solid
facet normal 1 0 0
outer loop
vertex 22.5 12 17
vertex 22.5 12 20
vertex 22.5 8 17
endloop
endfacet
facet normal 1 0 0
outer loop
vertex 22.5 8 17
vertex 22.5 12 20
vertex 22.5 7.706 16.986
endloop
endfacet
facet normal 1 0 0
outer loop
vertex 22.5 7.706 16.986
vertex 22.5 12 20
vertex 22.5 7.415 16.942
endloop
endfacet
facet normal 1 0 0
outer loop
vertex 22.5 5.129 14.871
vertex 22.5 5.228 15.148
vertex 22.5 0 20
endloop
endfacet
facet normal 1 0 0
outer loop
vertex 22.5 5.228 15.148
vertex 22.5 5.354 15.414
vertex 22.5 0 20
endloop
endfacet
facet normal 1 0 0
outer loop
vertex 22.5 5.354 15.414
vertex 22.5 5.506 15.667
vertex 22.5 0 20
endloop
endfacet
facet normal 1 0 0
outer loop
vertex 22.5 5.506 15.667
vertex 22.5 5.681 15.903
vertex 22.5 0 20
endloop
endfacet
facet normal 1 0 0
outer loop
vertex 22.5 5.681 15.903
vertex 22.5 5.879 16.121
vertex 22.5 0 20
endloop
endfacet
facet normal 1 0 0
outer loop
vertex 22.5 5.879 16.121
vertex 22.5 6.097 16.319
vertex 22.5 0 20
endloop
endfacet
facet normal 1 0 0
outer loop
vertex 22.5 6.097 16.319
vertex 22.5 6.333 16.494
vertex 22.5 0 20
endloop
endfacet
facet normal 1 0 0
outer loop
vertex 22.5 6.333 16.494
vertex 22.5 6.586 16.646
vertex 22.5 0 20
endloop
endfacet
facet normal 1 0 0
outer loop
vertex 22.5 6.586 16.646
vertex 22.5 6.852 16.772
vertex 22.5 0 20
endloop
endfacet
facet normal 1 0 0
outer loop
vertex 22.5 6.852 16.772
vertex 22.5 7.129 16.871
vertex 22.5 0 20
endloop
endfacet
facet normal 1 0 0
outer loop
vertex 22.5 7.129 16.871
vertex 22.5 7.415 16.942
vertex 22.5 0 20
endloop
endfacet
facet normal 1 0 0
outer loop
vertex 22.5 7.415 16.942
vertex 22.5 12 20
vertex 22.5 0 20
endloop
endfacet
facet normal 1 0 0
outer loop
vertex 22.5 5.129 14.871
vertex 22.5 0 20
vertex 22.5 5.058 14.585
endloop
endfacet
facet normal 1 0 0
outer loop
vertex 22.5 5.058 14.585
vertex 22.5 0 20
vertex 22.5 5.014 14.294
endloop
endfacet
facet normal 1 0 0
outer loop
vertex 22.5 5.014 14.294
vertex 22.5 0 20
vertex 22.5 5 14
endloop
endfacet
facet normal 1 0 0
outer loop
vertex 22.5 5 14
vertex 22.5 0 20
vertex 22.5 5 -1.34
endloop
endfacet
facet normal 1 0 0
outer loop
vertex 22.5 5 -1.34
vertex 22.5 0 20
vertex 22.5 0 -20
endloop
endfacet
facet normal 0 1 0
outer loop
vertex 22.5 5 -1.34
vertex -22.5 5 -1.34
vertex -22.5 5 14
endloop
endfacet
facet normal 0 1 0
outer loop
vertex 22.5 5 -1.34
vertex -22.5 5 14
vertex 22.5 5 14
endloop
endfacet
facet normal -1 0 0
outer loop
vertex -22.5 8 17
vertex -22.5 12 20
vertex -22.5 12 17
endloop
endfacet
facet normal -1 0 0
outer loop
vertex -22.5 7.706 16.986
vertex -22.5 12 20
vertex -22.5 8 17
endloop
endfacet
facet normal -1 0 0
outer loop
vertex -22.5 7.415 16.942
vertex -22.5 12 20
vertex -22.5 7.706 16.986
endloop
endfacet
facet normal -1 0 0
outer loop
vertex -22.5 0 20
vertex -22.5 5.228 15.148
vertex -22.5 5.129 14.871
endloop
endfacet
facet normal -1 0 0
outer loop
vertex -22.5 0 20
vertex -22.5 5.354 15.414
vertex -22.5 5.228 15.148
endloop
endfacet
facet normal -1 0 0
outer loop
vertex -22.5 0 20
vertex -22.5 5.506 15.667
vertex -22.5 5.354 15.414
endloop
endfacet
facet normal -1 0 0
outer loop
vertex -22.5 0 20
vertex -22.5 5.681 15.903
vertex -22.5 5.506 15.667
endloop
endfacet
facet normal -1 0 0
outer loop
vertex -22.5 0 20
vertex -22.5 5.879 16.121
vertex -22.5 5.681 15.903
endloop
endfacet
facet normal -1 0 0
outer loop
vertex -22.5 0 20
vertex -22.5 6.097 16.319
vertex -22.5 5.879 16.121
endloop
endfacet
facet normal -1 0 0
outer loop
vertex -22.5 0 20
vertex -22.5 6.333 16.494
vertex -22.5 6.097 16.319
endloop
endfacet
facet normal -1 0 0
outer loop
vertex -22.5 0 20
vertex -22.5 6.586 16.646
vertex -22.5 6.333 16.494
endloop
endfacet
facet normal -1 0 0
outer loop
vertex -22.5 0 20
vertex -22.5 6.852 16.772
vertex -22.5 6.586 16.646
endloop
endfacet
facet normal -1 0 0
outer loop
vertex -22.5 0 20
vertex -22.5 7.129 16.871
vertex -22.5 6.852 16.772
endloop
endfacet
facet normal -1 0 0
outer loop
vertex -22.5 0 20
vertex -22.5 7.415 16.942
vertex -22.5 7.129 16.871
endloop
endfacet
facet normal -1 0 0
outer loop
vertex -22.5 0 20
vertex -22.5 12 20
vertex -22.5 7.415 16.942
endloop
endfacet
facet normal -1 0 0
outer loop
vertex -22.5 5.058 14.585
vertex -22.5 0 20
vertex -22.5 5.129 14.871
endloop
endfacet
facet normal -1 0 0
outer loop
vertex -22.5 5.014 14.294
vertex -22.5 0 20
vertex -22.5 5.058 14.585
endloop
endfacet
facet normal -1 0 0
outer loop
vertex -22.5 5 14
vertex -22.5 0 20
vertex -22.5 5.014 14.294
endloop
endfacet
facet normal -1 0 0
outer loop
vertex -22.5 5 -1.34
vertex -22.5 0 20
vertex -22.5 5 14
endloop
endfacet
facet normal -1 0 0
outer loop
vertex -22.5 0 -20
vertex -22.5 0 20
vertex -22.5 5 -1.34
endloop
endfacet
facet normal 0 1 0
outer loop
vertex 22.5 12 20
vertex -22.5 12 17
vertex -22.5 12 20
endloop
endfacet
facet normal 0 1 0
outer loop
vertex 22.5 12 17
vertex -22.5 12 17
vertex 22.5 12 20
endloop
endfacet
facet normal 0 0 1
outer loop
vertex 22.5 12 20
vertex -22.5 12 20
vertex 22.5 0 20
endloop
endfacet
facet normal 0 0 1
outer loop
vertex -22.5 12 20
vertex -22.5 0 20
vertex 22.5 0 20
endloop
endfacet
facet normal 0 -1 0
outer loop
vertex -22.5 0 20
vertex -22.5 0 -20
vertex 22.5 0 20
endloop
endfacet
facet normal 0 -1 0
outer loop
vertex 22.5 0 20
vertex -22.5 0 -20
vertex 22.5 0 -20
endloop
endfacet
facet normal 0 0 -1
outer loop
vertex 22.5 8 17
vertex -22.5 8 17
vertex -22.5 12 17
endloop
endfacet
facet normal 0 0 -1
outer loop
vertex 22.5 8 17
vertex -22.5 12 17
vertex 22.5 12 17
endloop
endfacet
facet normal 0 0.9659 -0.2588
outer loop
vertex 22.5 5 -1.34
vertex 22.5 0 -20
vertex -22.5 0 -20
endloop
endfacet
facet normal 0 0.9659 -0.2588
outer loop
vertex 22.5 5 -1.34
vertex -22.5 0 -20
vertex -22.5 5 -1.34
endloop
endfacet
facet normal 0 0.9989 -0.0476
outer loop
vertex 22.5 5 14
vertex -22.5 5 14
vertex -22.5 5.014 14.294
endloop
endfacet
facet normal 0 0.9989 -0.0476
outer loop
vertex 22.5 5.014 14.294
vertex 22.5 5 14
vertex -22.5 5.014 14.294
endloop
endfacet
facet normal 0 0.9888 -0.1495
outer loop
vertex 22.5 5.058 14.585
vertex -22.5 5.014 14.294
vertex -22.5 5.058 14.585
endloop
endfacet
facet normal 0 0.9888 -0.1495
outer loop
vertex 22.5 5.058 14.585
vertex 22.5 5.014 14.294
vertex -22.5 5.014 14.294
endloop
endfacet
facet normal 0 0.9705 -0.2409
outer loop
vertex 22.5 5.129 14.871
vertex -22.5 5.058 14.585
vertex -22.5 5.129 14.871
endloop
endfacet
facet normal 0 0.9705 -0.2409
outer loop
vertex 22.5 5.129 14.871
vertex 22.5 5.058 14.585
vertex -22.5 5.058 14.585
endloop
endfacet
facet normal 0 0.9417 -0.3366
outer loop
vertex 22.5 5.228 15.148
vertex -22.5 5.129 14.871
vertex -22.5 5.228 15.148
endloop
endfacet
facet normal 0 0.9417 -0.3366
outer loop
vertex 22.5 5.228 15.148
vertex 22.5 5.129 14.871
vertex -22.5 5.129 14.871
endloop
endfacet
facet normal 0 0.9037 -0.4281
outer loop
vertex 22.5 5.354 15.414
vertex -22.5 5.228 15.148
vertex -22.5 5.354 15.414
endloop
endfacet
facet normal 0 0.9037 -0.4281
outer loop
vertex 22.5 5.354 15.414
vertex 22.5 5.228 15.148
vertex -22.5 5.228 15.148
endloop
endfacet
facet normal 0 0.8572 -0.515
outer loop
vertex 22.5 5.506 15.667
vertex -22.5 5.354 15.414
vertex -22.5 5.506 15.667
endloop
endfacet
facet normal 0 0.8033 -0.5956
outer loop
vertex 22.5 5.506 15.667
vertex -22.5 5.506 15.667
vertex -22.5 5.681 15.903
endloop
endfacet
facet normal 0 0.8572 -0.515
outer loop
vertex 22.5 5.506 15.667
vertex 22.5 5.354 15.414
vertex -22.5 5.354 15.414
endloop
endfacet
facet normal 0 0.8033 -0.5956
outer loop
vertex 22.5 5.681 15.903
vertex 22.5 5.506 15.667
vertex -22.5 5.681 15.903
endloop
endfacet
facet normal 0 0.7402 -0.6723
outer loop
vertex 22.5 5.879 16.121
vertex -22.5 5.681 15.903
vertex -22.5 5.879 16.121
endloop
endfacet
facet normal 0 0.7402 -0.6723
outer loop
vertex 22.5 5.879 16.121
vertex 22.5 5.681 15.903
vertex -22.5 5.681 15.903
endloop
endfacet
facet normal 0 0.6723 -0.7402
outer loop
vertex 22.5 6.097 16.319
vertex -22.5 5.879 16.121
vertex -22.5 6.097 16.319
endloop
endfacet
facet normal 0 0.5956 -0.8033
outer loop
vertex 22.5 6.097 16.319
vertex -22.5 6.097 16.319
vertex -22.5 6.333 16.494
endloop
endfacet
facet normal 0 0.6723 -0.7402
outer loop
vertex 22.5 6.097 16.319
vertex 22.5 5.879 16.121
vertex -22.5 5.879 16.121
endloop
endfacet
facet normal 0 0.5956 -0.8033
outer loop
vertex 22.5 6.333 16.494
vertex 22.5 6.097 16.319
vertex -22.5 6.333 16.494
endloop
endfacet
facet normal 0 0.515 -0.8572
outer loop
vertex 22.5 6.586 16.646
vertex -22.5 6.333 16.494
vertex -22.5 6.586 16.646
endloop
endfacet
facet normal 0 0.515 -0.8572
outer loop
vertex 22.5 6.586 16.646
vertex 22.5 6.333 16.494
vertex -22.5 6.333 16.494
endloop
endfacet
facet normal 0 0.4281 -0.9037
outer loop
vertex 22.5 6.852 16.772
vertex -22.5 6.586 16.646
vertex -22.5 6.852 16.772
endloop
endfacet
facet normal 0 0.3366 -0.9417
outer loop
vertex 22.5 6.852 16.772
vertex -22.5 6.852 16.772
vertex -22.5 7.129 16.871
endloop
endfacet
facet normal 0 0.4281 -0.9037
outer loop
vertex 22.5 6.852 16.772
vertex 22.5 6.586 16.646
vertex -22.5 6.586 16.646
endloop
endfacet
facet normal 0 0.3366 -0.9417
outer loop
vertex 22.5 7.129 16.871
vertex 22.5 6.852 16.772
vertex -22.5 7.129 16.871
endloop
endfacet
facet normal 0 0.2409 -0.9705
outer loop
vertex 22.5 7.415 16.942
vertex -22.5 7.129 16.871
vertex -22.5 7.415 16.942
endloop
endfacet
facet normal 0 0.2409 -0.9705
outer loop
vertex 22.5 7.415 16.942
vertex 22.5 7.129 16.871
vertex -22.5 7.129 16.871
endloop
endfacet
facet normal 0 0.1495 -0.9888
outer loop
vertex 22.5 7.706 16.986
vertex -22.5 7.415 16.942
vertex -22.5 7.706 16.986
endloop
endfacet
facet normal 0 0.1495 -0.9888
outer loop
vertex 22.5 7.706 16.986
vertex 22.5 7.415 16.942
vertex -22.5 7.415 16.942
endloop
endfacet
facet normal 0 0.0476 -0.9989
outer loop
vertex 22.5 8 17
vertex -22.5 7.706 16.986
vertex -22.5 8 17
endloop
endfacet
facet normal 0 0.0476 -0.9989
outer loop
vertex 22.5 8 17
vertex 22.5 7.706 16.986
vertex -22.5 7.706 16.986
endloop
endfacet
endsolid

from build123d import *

# Parameters (mm, degrees)
SKETCH1_W           = 45
SKETCH1_H           = 40
BOSS_EXTRUDE1_DEPTH = 5
CHAMFER1_SIZE       = 5
CHAMFER1_SIZE_2     = 18.660254038
SKETCH2_W           = 45
SKETCH2_H           = 3
BOSS_EXTRUDE2_DEPTH = 7
FILLET1_R           = 3


with BuildPart() as part:
    # Sketch1 → Boss-Extrude1 (new body)
    with BuildSketch(Plane(origin=(0, 0, 0), x_dir=(1, 0, 0), z_dir=(0, 1, 0))):
        Rectangle(SKETCH1_W, SKETCH1_H)
    extrude(amount=BOSS_EXTRUDE1_DEPTH)

    # Chamfer1
    # the kernel refuses this chamfer: 18.660254038, 5 mm, written as the material it takes off along each edge
    with BuildSketch(Plane(origin=(-70.955484165, 5, -20), x_dir=(0, -0.9905000388259539, -0.13751244702129164), z_dir=(1, 0, 0))) as chamfer1_piece_1:
        Polygon((CHAMFER1_SIZE * 0.990500038826, -CHAMFER1_SIZE * 0.137512447021), (-CHAMFER1_SIZE_2 * 0.13751244702, -CHAMFER1_SIZE_2 * 0.990500038818), (0, 0), align=None)
    extrude(amount=141.910968331, mode=Mode.SUBTRACT)

    # Sketch2 → Boss-Extrude2 (add)
    with BuildSketch(Plane(origin=(0, 5, 0), x_dir=(1, 0, 0), z_dir=(0, 1, 0))):
        with Locations((0, -18.5)):
            Rectangle(SKETCH2_W, SKETCH2_H)
    extrude(amount=BOSS_EXTRUDE2_DEPTH)

    # Fillet1
    fillet1_edges = [part.edges().sort_by_distance(p)[0] for p in [
        (0, 5, 17),
    ]]
    fillet(fillet1_edges, radius=FILLET1_R)


solid = part.part
